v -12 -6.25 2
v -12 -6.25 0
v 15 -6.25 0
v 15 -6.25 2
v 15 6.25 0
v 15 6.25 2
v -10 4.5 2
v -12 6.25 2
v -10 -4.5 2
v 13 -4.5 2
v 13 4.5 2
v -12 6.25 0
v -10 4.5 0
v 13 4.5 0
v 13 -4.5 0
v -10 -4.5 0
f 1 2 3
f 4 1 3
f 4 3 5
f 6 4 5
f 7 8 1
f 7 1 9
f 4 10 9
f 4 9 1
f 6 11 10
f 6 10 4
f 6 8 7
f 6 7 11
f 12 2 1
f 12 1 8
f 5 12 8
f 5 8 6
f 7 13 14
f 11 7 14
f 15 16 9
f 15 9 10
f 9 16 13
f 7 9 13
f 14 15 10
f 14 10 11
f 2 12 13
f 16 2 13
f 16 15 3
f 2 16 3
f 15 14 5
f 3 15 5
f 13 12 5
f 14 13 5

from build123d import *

# Parameters (mm, degrees)
SKETCH_W     = 23
SKETCH_H     = 9
PAD_DEPTH    = 30
SKETCH002_W  = 27
SKETCH002_H  = 12.5
PAD002_DEPTH = 2


with BuildPart() as display_hole_clone_body:
    # Sketch → Pad (new body)
    with BuildSketch(Plane.XY):
        with Locations((1.5, 0)):
            Rectangle(SKETCH_W, SKETCH_H)
    extrude(amount=PAD_DEPTH)


with BuildPart() as display_hole_clone_body_1:
    # Body placement: moved
    add(display_hole_clone_body.part.moved(Location((0, 0, -10))))


with BuildPart() as cut002:
    # Sketch002 → Pad002 (new body)
    with BuildSketch(Plane.XY):
        with Locations((1.5, 0)):
            Rectangle(SKETCH002_W, SKETCH002_H)
    extrude(amount=PAD002_DEPTH)

    # Cut002: cut display hole clone body
    add(display_hole_clone_body_1.part, mode=Mode.SUBTRACT)


solid = cut002.part
